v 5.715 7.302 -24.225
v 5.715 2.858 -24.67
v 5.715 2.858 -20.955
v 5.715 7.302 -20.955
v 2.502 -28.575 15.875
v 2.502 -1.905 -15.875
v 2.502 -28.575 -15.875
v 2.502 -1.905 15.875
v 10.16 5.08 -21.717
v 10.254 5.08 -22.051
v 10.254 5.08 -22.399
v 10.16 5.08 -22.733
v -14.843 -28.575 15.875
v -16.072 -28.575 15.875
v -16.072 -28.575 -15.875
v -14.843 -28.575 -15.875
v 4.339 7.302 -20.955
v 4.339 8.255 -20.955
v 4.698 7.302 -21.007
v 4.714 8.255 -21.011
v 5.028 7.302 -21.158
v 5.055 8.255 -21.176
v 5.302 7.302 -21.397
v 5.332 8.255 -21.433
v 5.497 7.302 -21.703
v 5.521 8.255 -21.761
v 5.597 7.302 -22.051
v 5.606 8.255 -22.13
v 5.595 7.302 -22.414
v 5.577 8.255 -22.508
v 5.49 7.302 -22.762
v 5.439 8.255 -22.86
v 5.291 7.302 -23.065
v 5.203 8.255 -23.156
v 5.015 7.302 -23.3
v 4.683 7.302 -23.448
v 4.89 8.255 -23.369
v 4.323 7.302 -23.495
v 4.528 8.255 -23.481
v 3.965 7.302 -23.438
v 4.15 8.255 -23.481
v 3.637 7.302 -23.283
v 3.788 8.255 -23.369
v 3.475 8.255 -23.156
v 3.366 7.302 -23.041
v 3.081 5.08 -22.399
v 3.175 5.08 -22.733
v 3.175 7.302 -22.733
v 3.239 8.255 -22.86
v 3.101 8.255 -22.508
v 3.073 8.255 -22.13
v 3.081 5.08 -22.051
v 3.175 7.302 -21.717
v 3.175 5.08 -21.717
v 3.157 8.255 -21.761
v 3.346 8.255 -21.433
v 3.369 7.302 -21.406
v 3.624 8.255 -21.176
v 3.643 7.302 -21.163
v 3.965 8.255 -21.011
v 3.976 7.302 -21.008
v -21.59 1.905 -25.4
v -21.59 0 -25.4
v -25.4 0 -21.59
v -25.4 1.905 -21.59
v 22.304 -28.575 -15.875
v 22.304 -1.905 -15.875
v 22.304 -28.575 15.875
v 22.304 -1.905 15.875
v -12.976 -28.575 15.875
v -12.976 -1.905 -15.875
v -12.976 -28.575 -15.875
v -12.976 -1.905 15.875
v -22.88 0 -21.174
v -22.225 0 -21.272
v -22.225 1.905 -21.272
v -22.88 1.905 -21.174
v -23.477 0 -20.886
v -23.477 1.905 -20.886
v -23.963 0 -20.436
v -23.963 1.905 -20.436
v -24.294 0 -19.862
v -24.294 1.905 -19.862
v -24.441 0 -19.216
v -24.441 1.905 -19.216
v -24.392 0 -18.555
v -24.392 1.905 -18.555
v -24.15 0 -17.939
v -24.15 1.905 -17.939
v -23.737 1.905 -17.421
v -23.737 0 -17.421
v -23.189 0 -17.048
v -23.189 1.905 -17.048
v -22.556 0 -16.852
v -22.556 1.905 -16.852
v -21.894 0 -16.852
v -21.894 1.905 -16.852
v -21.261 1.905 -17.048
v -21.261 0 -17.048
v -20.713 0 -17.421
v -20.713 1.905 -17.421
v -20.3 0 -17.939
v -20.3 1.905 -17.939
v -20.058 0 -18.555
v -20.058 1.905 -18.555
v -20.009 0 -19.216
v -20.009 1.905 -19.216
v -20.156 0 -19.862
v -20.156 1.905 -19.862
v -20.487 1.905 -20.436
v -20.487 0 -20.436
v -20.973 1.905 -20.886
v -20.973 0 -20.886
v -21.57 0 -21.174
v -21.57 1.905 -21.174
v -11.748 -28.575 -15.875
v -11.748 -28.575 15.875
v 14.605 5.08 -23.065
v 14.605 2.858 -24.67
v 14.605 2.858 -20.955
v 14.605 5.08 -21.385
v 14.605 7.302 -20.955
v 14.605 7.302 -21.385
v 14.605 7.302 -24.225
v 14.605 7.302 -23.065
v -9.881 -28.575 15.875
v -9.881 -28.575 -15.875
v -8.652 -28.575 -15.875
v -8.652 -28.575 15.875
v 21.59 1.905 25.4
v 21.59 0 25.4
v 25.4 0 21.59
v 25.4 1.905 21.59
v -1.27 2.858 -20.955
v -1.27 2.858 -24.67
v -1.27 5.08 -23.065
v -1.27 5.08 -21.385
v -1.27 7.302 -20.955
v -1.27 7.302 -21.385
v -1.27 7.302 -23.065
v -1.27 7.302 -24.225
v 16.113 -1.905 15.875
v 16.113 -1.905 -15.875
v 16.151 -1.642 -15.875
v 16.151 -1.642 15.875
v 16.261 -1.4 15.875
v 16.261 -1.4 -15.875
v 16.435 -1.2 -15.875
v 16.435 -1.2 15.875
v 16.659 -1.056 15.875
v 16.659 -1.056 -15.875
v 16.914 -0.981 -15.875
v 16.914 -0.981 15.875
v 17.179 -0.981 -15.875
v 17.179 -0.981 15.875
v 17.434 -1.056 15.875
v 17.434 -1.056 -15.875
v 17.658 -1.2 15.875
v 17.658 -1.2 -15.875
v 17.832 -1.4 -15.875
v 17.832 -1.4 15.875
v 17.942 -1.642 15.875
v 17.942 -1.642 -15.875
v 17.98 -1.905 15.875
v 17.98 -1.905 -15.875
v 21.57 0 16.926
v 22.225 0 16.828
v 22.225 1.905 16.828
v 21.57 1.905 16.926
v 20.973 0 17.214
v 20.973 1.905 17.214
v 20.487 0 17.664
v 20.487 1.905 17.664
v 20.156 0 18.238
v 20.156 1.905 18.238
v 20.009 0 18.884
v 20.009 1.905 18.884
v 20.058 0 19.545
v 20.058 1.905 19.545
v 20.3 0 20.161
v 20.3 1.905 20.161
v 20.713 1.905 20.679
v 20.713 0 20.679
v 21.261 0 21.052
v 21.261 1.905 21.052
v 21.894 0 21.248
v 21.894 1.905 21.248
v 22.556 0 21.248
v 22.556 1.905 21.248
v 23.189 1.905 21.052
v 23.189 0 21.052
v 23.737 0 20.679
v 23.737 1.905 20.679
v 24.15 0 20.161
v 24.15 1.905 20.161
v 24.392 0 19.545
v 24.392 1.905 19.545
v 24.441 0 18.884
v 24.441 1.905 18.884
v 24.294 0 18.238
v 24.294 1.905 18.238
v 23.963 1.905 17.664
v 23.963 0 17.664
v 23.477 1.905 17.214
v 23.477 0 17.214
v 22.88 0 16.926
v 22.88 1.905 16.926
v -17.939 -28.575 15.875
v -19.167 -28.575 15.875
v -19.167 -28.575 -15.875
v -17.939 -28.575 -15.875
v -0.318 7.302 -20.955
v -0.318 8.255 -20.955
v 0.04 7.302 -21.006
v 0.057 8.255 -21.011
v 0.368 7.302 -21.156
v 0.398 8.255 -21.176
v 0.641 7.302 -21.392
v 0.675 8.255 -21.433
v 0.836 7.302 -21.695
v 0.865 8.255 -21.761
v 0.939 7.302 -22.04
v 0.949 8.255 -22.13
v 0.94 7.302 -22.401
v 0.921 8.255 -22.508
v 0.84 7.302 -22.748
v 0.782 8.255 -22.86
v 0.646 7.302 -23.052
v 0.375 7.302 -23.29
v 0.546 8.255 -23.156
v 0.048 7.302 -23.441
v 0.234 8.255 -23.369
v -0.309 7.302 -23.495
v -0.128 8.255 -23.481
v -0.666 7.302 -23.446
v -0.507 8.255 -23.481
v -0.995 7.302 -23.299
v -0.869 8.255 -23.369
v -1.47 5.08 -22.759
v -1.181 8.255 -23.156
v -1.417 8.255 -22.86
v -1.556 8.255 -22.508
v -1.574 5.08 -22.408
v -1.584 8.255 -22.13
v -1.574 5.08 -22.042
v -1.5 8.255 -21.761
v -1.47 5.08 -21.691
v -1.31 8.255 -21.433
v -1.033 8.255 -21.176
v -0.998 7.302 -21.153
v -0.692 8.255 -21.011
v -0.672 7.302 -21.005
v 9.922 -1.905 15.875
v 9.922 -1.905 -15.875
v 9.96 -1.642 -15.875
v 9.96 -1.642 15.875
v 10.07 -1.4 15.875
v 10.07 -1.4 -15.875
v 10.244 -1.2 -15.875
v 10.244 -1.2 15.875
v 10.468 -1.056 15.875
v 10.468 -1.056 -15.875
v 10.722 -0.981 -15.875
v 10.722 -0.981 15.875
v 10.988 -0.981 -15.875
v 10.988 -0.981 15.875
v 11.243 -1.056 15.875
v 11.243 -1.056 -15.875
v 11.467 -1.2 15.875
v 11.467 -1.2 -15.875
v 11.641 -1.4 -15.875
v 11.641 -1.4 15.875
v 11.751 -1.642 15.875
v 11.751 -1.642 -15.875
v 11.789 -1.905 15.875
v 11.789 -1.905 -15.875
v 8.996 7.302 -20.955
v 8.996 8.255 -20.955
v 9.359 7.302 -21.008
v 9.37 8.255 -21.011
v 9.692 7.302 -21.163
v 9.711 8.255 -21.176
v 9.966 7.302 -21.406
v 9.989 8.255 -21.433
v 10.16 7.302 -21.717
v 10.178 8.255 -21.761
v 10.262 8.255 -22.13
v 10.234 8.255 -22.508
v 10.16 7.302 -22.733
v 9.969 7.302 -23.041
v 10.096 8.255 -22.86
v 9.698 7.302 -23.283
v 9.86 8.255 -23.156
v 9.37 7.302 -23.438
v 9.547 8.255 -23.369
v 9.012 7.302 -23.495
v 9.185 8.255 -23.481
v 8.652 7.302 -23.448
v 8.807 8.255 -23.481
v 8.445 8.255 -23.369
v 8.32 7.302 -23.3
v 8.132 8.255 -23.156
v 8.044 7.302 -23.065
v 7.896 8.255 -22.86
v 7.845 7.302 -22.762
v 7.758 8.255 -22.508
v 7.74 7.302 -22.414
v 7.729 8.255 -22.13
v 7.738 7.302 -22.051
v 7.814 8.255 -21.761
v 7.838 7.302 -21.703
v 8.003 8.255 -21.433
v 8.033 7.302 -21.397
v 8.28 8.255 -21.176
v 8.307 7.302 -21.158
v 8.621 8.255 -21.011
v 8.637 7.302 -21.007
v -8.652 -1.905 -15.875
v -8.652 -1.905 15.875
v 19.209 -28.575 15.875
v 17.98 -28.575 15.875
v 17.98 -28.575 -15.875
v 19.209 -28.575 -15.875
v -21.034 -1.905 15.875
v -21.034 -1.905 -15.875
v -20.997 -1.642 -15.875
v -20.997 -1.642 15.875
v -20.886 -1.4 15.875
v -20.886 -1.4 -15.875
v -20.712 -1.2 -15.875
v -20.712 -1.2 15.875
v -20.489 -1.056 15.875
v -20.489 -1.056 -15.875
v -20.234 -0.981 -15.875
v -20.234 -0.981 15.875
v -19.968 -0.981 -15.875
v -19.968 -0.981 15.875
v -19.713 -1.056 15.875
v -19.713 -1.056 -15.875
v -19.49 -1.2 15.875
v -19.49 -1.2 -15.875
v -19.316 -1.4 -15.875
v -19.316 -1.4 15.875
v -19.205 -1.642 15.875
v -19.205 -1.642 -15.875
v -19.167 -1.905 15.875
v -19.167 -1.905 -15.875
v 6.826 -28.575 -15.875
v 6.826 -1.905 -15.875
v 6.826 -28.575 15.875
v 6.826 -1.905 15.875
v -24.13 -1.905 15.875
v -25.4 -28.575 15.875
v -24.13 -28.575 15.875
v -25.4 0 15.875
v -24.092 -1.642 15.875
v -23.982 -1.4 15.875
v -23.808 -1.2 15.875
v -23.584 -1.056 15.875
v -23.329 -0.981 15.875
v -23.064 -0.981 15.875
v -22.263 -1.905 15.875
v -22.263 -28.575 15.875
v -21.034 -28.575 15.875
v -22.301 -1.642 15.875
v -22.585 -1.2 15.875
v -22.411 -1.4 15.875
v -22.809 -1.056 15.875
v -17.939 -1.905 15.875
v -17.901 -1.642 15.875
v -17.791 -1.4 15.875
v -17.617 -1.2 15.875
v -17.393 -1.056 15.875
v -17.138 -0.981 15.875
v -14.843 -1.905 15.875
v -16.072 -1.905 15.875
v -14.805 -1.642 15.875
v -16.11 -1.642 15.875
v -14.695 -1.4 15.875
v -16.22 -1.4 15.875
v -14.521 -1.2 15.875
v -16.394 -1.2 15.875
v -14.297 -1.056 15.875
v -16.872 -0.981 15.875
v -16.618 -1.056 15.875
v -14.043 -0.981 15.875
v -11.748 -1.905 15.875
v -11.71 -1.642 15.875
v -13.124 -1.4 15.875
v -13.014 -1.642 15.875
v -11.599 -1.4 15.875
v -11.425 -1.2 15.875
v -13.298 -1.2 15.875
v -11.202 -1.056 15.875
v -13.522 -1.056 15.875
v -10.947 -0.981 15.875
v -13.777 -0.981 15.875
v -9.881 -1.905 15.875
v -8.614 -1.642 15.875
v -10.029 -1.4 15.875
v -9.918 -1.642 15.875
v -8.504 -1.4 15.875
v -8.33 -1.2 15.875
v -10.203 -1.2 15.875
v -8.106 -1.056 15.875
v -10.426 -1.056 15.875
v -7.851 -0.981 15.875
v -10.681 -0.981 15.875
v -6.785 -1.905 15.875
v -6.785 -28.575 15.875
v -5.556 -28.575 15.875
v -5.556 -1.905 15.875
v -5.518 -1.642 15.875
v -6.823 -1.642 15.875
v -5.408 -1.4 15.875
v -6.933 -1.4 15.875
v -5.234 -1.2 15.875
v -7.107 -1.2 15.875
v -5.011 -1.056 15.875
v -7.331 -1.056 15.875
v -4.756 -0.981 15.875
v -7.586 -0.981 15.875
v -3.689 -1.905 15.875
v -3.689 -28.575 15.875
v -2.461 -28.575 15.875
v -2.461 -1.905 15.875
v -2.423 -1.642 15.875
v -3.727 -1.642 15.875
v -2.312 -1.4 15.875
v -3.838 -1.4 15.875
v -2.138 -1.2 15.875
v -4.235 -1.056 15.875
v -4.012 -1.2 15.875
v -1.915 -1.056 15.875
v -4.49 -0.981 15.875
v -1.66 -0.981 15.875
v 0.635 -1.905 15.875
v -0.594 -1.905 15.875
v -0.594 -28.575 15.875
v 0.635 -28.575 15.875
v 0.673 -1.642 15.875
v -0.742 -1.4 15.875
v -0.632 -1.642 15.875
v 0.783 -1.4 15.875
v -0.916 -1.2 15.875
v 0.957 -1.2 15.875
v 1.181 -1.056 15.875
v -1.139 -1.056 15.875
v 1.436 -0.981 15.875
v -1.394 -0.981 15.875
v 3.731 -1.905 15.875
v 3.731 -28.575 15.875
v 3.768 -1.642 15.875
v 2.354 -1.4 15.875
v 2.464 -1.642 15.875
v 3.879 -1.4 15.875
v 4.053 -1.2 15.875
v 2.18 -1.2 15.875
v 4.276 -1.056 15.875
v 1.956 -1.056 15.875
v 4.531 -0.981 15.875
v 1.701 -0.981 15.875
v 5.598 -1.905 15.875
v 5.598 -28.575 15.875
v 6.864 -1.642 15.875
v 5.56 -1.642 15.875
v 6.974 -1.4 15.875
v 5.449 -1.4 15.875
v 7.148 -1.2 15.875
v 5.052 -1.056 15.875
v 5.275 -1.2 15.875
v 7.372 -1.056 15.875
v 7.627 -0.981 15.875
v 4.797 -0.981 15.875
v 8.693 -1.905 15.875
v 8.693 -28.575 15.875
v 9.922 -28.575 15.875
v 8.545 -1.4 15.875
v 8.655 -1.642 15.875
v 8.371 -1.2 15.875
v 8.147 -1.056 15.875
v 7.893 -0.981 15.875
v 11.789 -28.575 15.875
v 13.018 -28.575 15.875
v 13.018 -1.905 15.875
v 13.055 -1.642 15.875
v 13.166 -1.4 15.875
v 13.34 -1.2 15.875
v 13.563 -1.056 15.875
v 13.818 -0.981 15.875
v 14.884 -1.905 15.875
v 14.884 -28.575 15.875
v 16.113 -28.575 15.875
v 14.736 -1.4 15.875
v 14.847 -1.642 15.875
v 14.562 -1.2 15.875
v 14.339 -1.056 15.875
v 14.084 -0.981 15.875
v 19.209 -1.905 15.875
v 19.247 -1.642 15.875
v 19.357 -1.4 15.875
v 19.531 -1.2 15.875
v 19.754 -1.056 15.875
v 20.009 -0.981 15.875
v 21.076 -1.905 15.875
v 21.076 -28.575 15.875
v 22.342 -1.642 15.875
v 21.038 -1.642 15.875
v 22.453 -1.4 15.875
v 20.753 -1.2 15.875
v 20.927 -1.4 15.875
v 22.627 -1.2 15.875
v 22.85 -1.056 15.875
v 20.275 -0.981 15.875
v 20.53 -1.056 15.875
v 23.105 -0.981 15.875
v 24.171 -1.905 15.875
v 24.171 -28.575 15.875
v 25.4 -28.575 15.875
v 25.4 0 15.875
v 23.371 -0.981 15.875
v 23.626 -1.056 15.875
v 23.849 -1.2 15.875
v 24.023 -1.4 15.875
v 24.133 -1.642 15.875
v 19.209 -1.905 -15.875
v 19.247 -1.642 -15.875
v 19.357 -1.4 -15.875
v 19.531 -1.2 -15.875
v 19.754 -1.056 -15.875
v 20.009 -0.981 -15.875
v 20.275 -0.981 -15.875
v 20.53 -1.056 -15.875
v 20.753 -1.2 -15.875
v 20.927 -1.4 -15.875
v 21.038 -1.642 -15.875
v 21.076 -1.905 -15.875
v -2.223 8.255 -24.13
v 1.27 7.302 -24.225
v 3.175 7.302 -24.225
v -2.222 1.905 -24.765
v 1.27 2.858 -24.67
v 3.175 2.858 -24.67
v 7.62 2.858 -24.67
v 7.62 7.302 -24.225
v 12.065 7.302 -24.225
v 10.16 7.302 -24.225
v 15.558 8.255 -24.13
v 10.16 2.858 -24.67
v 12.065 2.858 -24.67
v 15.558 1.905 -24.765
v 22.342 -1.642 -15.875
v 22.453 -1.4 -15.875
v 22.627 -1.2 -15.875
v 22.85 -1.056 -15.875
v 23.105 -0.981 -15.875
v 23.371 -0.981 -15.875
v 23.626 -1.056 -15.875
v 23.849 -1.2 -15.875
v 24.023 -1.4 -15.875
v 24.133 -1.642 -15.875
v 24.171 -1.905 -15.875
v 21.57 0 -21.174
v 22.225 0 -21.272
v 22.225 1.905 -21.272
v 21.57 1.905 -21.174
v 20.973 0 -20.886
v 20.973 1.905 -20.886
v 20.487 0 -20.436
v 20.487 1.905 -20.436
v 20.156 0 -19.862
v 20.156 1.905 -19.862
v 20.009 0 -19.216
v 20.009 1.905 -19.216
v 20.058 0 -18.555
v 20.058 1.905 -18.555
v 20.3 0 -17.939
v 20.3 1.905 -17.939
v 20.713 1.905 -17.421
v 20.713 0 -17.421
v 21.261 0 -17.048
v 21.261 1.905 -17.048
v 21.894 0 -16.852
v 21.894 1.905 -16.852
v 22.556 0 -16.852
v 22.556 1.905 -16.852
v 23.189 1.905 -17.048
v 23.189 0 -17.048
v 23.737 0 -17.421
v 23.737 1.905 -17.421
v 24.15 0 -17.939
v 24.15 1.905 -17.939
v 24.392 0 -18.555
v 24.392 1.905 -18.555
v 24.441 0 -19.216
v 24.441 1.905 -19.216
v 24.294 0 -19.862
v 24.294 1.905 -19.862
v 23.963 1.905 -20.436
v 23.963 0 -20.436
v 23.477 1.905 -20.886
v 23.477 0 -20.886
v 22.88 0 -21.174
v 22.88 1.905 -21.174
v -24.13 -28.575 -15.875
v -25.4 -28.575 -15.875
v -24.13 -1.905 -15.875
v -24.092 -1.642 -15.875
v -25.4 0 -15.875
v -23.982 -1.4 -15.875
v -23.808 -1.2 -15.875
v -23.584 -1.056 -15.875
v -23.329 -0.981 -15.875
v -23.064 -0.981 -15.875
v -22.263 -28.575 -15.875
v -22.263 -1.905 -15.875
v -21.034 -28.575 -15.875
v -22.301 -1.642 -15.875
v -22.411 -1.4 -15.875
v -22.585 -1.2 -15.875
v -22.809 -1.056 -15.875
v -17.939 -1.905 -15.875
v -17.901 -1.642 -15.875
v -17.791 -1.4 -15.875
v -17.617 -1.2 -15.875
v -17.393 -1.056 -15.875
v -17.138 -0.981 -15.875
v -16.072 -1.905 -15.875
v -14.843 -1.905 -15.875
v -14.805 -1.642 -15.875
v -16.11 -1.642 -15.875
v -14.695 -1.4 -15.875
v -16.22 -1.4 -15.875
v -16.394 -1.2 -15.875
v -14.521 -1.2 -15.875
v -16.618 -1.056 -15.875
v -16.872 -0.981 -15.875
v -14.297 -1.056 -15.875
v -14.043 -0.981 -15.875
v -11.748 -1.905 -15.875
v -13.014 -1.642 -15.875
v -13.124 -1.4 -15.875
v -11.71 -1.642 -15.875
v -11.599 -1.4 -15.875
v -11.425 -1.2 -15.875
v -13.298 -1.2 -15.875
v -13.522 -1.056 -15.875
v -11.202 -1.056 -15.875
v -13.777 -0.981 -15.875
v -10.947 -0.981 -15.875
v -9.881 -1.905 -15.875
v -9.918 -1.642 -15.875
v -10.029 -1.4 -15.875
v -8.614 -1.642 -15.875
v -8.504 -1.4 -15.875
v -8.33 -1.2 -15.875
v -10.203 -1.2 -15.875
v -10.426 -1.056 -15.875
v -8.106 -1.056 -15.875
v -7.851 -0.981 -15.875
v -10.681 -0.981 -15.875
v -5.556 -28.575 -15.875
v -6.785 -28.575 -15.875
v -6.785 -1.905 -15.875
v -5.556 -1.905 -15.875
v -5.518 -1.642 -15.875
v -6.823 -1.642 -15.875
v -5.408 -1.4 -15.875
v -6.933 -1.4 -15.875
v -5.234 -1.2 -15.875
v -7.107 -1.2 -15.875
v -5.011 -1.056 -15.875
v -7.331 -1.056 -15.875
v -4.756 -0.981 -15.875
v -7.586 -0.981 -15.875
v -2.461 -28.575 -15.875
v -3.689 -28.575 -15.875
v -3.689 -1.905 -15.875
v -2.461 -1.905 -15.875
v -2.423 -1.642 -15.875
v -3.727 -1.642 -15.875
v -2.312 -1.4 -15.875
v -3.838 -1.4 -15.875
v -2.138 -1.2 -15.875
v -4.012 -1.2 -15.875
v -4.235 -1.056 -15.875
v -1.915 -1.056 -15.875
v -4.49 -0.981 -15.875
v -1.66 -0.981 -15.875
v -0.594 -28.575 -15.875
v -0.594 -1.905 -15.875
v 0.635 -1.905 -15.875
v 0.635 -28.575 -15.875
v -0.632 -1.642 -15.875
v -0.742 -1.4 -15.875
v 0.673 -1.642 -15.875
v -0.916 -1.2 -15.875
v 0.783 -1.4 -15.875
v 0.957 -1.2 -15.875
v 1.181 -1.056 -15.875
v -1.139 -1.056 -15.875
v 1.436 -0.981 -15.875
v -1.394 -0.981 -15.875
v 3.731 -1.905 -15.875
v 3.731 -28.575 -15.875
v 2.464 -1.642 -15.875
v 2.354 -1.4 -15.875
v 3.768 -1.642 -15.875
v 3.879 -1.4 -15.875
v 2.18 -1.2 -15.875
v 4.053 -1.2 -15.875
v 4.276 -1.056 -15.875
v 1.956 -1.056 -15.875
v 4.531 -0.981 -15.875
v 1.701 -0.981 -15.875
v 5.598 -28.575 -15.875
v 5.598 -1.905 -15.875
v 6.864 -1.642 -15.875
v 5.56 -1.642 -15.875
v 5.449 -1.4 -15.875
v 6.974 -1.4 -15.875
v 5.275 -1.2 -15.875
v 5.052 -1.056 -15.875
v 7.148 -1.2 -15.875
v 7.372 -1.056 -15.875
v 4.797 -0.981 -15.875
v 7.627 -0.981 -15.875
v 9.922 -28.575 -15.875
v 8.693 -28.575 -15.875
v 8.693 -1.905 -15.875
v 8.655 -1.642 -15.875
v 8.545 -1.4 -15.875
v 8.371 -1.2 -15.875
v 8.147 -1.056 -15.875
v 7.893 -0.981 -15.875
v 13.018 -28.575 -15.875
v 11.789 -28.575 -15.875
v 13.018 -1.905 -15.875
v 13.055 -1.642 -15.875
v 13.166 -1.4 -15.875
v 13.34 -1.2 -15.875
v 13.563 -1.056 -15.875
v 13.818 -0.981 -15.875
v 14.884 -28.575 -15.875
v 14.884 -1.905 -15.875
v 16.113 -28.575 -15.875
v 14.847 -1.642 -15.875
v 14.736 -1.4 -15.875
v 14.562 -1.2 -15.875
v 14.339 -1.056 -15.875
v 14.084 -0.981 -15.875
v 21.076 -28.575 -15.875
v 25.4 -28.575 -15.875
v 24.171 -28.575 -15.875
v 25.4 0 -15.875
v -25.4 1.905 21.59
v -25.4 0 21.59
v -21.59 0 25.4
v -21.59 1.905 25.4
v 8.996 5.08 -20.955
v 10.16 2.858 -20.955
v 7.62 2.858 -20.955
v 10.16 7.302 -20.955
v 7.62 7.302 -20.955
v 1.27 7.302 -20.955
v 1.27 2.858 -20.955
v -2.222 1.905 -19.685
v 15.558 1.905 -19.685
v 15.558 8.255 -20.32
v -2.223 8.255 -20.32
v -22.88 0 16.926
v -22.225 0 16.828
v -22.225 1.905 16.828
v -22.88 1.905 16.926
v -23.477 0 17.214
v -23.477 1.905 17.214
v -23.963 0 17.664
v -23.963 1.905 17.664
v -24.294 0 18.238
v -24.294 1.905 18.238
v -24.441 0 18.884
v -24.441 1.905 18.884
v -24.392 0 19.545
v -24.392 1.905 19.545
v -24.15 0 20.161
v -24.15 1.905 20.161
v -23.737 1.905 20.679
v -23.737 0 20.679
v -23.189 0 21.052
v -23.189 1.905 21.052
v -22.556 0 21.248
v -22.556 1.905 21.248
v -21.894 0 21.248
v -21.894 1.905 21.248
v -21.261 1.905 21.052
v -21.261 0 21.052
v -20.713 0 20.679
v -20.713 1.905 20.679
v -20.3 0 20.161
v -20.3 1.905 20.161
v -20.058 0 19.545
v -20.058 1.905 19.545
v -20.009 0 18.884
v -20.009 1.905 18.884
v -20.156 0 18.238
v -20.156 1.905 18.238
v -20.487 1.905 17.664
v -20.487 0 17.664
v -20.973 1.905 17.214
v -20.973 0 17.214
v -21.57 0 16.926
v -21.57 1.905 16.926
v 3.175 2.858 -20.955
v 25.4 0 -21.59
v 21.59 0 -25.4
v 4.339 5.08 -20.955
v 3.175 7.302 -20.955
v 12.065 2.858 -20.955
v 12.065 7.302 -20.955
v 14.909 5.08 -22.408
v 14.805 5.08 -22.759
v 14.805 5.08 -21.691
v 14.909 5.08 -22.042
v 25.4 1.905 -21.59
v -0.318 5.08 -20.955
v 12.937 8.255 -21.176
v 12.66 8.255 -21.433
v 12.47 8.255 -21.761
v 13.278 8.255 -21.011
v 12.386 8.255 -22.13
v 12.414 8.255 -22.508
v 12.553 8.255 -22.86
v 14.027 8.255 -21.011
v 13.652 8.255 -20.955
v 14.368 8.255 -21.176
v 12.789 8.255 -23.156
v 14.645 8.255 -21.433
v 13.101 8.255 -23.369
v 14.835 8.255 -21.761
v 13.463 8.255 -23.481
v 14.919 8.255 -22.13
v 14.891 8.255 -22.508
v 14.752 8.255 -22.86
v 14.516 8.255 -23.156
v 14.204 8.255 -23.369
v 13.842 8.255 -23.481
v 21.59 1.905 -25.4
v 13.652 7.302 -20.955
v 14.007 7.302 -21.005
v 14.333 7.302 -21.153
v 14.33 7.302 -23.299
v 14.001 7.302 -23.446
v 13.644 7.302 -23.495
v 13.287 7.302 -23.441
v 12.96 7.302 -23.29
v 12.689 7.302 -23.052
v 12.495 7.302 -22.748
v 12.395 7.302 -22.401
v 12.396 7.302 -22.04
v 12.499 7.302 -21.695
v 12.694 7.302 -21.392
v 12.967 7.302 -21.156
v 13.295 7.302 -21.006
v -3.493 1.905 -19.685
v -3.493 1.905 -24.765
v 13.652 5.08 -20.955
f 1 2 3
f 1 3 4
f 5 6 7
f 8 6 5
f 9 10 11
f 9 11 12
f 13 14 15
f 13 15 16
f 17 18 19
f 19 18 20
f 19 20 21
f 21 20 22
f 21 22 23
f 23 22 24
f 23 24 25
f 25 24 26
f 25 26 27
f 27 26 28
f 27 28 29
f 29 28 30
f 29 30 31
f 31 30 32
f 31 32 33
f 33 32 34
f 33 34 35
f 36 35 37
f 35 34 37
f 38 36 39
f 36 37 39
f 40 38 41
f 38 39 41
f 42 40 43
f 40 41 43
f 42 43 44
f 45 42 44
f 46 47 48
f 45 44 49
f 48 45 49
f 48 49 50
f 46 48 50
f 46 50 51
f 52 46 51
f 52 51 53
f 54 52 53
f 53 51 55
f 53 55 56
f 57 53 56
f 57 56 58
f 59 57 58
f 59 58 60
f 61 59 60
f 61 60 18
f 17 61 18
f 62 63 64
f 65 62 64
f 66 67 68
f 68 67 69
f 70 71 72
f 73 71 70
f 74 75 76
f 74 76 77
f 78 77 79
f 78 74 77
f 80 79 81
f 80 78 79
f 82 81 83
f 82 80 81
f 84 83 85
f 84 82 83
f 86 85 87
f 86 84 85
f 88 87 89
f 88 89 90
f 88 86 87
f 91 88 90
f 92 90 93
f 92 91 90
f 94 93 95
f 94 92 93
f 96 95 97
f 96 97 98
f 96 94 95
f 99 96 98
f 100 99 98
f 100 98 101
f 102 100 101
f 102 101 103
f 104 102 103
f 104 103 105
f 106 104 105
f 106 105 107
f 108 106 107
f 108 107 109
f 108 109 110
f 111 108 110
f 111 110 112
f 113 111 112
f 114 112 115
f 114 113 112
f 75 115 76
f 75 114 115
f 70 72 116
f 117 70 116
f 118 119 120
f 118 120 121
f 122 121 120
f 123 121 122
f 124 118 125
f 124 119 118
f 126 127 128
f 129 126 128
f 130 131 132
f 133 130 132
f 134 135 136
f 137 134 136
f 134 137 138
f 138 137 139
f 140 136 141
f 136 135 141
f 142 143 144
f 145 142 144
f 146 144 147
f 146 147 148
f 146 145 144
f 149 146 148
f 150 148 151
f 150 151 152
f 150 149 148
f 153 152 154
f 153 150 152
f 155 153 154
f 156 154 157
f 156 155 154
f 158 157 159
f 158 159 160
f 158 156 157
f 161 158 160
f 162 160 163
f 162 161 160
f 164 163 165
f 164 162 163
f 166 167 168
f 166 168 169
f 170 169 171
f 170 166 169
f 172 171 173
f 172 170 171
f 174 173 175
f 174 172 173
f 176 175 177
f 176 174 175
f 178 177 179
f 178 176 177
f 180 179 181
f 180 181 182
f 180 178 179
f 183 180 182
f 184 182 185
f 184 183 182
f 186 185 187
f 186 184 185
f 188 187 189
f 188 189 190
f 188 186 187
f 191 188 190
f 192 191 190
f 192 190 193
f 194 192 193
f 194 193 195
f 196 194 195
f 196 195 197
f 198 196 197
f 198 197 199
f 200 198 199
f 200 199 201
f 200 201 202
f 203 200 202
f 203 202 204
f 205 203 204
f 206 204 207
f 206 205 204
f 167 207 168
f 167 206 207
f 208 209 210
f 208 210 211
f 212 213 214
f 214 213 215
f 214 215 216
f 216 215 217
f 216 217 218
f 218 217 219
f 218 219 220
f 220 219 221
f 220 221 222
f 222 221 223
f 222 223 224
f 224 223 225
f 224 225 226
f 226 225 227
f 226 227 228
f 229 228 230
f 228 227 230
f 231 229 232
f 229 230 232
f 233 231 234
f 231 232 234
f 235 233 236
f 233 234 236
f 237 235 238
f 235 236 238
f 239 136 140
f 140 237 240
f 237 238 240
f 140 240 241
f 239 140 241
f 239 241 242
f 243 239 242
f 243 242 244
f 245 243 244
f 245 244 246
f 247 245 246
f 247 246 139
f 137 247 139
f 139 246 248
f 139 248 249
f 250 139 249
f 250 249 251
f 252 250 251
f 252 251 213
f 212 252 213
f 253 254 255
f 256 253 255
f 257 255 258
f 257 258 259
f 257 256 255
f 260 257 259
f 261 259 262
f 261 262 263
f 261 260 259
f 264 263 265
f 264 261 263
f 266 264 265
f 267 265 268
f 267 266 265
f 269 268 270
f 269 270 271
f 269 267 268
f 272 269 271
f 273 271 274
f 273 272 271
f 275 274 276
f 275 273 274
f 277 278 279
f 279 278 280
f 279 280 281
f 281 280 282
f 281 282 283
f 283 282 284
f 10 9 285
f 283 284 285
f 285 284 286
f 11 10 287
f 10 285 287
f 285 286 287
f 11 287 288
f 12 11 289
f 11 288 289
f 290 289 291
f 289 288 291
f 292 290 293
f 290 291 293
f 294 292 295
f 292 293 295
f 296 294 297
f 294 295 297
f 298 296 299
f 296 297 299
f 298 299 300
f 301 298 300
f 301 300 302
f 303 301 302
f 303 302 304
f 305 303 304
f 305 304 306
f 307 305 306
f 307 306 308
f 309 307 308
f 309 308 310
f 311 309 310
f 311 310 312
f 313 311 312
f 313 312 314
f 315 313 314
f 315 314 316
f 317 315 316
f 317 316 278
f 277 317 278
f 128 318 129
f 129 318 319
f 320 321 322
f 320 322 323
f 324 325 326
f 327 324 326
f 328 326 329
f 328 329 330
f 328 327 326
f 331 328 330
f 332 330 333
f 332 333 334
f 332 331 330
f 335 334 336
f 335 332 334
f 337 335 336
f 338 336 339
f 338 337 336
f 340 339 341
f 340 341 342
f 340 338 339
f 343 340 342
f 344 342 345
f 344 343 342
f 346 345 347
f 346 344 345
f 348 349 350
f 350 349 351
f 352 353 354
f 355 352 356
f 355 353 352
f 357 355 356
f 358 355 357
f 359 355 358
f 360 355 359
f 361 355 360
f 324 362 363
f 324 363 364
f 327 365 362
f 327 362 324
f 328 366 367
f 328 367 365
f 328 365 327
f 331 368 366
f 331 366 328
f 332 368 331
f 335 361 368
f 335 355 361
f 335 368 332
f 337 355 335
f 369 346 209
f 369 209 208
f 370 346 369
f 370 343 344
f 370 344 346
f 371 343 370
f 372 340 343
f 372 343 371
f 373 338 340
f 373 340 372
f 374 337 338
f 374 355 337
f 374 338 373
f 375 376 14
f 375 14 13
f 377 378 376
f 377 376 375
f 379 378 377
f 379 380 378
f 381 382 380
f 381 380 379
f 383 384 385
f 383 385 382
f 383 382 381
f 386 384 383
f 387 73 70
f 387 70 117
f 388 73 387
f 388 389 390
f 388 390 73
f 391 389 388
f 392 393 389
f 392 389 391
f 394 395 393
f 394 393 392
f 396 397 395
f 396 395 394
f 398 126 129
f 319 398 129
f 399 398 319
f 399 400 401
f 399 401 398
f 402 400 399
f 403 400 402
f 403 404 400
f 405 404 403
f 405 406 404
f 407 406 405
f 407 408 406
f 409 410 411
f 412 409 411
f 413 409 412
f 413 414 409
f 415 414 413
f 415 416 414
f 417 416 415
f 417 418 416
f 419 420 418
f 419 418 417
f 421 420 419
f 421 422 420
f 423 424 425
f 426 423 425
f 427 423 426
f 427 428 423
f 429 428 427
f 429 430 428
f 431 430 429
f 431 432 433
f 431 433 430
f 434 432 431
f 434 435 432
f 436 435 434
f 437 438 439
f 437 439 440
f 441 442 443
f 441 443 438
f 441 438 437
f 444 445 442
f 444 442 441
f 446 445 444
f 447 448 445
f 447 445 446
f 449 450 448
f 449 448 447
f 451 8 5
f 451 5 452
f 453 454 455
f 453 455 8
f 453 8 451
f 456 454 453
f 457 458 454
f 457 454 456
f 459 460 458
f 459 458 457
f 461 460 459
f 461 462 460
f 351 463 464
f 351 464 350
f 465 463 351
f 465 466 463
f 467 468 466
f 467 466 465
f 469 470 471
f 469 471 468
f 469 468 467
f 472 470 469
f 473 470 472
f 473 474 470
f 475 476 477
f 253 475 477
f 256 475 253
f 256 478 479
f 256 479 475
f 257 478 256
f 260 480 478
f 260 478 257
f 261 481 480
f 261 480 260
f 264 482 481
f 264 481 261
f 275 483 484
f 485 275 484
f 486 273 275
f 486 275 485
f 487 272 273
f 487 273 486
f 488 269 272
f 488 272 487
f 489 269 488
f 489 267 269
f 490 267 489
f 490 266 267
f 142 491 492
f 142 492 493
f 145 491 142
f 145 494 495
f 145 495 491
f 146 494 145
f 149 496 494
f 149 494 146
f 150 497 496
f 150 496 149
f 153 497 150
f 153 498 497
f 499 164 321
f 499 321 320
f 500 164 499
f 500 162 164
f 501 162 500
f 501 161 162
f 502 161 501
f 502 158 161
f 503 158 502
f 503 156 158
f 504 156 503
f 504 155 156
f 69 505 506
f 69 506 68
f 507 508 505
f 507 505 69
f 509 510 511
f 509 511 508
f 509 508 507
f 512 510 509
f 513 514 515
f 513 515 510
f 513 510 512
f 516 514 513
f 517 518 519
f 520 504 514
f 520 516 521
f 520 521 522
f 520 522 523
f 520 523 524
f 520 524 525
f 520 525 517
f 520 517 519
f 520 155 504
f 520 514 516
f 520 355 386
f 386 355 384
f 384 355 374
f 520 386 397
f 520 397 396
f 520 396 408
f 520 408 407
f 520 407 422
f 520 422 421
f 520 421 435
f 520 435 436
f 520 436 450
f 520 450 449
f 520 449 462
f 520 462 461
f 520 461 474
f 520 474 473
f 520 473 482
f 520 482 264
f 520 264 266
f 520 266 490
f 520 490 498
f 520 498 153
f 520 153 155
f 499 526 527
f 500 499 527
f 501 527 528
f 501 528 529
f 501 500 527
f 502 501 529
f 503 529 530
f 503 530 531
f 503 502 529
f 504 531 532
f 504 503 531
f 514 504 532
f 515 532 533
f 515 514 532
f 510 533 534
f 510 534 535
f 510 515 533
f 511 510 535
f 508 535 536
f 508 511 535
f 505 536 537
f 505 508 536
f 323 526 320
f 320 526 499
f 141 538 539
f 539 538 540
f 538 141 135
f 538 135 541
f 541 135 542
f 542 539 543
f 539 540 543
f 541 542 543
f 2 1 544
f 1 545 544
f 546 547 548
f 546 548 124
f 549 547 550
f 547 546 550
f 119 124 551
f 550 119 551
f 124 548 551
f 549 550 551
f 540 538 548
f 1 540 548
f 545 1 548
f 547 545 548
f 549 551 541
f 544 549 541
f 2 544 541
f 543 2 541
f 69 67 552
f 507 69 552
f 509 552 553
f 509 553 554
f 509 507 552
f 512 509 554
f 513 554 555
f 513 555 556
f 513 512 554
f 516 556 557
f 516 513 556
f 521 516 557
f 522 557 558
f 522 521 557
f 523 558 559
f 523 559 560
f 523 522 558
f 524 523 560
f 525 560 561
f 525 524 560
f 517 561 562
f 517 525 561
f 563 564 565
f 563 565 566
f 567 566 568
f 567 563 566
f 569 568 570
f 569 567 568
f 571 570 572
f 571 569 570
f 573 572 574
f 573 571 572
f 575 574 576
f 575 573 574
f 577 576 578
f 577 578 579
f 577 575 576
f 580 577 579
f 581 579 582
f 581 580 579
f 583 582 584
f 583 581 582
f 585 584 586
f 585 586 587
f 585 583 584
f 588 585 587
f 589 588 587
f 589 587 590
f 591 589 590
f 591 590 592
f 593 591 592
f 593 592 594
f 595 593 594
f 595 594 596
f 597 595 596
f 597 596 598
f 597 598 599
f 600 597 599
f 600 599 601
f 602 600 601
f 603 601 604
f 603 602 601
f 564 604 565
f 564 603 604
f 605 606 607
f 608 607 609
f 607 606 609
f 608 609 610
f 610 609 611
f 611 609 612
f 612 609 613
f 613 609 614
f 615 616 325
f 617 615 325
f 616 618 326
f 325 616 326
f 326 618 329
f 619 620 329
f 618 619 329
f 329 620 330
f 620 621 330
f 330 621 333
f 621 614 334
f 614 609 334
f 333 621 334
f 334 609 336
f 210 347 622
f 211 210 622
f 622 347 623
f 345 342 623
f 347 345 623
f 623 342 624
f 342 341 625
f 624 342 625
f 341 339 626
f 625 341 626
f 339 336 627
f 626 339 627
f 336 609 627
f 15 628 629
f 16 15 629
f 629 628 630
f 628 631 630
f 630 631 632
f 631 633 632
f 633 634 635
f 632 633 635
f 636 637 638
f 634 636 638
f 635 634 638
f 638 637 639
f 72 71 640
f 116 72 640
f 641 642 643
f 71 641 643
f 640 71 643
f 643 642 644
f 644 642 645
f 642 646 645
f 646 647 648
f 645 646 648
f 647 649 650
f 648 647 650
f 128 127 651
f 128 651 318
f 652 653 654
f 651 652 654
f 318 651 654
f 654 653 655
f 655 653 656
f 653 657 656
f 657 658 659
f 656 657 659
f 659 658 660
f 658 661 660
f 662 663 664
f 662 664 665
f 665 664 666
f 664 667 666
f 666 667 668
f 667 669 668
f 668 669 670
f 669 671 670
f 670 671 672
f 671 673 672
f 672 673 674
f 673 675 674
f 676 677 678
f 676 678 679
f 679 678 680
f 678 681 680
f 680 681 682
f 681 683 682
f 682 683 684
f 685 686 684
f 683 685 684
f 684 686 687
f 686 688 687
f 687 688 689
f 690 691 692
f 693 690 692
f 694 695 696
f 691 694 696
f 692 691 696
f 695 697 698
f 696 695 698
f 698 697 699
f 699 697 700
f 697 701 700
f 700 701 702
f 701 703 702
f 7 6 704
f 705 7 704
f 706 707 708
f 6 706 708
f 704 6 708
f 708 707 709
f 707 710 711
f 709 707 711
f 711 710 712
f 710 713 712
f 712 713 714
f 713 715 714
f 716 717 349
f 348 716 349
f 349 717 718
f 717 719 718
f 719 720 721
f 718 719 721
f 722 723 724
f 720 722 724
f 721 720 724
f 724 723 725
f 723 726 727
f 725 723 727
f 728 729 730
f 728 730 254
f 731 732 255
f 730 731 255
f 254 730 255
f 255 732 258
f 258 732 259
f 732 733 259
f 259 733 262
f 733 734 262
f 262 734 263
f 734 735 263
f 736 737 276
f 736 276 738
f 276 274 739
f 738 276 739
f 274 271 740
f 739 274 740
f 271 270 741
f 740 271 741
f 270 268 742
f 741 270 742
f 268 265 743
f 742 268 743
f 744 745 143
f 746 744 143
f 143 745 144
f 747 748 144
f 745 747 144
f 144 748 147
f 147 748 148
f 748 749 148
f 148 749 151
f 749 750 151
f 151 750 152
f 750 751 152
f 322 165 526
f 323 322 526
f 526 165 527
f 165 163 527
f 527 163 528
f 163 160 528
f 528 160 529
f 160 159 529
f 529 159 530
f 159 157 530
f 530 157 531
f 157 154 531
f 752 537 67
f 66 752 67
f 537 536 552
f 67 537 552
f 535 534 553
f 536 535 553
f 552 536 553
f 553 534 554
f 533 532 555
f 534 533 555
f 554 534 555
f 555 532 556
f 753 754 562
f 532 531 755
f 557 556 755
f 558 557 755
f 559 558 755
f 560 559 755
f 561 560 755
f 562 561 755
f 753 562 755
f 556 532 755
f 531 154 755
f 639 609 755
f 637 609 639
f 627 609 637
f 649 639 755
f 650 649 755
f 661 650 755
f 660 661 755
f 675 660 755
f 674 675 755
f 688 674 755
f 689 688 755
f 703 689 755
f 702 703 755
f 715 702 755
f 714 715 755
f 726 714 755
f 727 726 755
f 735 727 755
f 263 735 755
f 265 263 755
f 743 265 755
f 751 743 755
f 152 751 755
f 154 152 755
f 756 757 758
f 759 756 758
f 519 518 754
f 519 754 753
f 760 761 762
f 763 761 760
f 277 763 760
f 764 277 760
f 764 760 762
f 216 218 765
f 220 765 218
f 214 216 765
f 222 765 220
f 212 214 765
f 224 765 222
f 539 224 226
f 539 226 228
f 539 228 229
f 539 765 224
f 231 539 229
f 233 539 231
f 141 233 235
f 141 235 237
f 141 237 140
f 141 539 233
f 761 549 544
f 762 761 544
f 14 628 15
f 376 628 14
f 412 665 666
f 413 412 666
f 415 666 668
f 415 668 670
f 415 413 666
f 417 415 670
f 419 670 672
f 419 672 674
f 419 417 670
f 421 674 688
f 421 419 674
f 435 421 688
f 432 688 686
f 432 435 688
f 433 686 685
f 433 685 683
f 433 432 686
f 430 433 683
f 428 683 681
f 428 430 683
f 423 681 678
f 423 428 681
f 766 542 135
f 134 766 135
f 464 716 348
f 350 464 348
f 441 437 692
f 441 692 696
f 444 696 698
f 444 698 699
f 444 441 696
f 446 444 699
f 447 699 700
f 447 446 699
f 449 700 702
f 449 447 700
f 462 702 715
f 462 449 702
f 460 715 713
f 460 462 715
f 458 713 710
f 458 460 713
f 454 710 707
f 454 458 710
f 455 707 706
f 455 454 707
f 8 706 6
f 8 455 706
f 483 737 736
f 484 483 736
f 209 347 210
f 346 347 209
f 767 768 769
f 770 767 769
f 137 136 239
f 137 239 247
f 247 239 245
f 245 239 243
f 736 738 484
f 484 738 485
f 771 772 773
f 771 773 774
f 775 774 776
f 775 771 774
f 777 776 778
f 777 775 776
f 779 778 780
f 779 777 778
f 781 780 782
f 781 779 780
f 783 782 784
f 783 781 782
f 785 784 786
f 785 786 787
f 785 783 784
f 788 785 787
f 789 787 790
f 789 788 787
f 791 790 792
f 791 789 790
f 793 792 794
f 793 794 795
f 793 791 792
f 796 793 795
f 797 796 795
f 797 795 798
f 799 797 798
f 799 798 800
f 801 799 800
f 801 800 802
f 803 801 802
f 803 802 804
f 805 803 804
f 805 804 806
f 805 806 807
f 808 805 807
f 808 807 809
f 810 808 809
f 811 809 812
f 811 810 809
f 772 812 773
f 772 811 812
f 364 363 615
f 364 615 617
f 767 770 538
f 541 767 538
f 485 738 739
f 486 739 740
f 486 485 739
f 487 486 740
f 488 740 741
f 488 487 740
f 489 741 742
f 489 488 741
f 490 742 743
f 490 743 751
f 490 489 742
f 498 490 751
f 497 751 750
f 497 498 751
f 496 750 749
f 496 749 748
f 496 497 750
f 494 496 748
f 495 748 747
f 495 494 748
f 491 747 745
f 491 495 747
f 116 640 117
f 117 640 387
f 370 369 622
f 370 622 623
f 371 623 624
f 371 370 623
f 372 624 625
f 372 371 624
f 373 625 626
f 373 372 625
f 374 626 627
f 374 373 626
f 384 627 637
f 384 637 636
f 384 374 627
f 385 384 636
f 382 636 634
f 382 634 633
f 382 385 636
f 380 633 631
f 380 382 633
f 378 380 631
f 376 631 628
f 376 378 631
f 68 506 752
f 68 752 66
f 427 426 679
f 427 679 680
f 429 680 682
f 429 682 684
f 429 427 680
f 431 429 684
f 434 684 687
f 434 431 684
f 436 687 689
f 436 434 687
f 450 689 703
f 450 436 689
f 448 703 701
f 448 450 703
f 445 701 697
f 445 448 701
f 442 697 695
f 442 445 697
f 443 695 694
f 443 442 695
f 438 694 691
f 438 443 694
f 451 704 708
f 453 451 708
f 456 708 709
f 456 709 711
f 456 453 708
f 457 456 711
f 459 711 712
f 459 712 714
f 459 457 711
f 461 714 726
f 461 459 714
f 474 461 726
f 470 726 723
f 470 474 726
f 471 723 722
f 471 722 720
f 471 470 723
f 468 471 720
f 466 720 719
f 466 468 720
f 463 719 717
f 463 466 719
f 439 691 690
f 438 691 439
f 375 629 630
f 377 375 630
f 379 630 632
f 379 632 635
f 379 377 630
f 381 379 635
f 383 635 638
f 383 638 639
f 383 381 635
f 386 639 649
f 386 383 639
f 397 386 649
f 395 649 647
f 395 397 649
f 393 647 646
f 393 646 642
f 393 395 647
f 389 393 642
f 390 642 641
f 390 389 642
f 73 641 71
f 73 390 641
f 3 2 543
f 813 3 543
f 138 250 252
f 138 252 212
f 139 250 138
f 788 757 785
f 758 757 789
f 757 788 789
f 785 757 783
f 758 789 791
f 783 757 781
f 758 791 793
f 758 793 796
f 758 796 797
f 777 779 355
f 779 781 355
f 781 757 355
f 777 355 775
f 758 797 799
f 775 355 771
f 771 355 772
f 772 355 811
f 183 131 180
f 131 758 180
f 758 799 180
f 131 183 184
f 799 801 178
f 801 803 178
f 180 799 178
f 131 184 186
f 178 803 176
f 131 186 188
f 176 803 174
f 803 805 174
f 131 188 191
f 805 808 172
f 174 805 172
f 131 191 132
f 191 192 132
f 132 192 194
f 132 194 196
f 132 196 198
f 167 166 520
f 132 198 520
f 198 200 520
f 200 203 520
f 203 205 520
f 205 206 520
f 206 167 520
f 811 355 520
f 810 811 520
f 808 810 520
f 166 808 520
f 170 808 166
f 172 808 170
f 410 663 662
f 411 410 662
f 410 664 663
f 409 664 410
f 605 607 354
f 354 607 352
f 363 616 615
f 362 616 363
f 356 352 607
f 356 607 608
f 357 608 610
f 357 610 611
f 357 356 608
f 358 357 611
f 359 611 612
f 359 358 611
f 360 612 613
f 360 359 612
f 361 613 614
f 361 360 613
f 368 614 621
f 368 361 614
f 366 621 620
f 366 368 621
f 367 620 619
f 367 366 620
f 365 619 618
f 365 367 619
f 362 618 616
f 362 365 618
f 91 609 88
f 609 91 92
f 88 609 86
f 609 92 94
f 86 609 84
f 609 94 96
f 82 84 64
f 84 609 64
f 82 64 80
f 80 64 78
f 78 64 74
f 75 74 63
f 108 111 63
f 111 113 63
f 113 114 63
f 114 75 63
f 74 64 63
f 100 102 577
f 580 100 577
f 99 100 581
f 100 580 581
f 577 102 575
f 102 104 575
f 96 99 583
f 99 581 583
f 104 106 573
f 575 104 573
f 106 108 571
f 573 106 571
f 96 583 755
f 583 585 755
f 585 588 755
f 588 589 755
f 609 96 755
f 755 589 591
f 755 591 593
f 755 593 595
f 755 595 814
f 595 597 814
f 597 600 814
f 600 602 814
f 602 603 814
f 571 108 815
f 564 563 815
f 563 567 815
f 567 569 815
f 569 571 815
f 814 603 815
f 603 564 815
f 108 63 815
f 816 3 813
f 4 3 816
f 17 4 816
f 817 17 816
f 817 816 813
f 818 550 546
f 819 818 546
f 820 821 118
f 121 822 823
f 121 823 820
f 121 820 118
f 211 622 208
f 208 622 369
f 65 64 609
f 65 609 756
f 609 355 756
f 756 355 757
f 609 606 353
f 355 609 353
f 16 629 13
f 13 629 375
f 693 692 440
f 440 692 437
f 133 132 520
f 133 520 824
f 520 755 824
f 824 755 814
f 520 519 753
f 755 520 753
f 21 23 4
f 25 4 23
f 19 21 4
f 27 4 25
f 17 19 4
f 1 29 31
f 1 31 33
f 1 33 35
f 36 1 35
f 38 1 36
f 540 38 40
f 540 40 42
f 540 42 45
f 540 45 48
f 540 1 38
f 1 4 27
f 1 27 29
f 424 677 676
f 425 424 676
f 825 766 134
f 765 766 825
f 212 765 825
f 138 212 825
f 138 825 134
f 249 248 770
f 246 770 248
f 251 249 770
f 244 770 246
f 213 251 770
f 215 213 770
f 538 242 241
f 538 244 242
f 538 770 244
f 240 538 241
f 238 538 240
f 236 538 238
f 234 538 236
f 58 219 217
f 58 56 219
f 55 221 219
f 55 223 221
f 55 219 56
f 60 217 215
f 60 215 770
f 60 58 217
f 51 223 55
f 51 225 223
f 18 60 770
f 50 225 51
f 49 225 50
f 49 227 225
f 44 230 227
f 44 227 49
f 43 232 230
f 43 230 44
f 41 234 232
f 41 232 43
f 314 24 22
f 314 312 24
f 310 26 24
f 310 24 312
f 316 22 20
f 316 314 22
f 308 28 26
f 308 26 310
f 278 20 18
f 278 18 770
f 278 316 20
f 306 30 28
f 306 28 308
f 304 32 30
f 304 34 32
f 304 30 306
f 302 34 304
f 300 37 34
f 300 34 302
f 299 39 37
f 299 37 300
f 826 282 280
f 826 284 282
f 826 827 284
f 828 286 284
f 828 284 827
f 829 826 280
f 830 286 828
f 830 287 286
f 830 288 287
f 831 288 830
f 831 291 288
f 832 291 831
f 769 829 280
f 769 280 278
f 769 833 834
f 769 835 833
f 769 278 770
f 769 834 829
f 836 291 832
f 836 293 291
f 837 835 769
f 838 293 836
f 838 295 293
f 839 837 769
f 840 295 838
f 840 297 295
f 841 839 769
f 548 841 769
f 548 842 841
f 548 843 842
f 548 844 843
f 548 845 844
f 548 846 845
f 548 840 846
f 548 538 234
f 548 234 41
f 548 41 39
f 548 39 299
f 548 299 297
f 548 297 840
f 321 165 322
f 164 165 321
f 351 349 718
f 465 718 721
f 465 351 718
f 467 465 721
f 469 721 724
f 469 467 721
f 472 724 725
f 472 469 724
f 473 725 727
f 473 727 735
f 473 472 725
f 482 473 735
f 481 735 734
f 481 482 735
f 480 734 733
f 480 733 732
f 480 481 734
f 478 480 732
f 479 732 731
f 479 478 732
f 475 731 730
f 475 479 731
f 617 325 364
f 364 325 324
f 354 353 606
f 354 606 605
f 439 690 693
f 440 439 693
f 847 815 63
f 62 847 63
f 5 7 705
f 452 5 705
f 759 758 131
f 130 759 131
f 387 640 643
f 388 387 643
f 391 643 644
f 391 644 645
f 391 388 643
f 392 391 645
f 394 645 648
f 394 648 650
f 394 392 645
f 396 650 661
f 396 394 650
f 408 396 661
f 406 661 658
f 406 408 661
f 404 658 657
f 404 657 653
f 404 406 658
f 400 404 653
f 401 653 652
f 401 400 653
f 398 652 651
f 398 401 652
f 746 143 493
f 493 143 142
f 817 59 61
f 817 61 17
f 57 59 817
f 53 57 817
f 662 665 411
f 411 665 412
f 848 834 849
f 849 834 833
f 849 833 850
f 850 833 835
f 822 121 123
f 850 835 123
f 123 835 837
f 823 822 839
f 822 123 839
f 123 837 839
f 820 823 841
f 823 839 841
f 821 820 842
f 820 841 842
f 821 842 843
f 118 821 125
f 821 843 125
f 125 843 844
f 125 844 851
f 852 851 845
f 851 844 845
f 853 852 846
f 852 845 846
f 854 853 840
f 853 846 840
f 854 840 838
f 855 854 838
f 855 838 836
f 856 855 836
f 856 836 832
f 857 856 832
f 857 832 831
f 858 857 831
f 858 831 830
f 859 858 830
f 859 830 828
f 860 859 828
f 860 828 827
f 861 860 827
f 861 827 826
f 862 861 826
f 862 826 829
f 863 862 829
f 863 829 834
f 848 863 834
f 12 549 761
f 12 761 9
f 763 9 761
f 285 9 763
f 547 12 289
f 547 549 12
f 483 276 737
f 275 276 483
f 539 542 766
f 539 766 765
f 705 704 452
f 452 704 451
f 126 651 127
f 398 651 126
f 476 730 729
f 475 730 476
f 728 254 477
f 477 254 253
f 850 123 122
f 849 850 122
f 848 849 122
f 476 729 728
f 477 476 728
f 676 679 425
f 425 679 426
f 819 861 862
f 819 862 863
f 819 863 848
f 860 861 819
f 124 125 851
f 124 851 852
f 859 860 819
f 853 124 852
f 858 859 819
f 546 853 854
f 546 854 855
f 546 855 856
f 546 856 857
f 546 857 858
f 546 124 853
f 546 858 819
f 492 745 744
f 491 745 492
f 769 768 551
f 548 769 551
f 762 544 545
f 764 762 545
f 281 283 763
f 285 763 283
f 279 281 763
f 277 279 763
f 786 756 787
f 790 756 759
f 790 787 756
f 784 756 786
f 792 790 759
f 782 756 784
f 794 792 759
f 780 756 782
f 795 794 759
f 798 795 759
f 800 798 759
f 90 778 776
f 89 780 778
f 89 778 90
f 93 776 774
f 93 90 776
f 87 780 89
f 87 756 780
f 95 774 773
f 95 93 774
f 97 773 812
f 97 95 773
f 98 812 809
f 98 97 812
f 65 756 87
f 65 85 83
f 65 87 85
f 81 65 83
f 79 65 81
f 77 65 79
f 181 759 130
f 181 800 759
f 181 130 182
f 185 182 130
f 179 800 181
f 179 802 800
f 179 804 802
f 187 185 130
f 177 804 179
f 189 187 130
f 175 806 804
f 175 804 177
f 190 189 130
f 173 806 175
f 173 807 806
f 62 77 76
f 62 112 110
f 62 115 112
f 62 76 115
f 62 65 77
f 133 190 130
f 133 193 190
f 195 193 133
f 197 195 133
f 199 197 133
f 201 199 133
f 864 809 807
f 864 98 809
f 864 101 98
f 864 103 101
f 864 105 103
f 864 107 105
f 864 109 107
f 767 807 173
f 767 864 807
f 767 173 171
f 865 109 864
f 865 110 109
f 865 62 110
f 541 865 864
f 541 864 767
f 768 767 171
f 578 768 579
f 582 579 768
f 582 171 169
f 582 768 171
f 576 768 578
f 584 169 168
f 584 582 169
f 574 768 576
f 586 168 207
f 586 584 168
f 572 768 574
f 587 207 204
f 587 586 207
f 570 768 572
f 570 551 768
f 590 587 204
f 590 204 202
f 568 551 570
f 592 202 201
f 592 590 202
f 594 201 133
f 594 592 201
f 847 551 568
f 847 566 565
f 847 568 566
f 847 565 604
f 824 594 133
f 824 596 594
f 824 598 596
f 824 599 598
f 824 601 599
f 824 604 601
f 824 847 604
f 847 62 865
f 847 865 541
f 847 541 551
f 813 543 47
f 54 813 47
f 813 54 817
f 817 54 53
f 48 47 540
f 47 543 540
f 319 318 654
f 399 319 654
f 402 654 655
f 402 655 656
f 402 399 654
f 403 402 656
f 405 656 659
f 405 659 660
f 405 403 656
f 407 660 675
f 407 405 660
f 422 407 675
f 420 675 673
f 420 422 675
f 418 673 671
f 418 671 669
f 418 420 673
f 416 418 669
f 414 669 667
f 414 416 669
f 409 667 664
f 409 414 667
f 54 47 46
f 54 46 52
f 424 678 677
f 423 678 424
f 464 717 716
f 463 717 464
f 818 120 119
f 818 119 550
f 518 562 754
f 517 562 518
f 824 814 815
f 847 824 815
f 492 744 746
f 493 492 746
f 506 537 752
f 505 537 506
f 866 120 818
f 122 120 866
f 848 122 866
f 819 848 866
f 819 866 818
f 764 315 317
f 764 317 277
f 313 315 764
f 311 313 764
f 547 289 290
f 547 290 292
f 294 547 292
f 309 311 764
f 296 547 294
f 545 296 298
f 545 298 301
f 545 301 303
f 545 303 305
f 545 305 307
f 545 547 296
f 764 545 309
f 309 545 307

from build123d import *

# Parameters (mm, degrees)
SKETCH1_R           = 2.2225
BOSS_EXTRUDE1_DEPTH = 1.905
SKETCH2_W           = 1.228725
SKETCH2_H           = 31.75
SKETCH2_W_2         = 1.27
BOSS_EXTRUDE2_DEPTH = 28.575
BOSS_EXTRUDE4_DEPTH = 31.75
SKETCH4_W           = 17.78
SKETCH4_H           = 5.08
BOSS_EXTRUDE5_DEPTH = 6.35
CUT_EXTRUDE1_DEPTH  = 19.05
SKETCH6_R           = 1.27
CUT_EXTRUDE2_DEPTH  = 3.175
SKETCH7_W           = 2.54
SKETCH7_H           = 4.445
CUT_EXTRUDE3_DEPTH  = 4.445


with BuildPart() as part:
    # Sketch1 → Boss-Extrude1 (new body)
    with BuildSketch(Plane(origin=(0, 0, 0), x_dir=(1, 0, 0), z_dir=(0, 1, 0))):
        Polygon((21.59, 25.4), (-21.59, 25.4), (-25.4, 21.59), (-25.4, -21.59), (-21.59, -25.4), (21.59, -25.4), (25.4, -21.59), (25.4, 21.59), align=None)
        with Locations((-22.225, -19.05)):
            Circle(SKETCH1_R, mode=Mode.SUBTRACT)
        with Locations((22.225, -19.05)):
            Circle(SKETCH1_R, mode=Mode.SUBTRACT)
        with Locations((-22.225, 19.05)):
            Circle(SKETCH1_R, mode=Mode.SUBTRACT)
        with Locations((22.225, 19.05)):
            Circle(SKETCH1_R, mode=Mode.SUBTRACT)
    extrude(amount=BOSS_EXTRUDE1_DEPTH)

    # Sketch2 → Boss-Extrude2 (add)
    with BuildSketch(Plane.XZ):
        with Locations((24.7856375, 0)):
            Rectangle(SKETCH2_W, SKETCH2_H)
        with Locations((21.6900125, 0)):
            Rectangle(SKETCH2_W, SKETCH2_H)
        with Locations((18.5943875, 0)):
            Rectangle(SKETCH2_W, SKETCH2_H)
        with Locations((15.4987625, 0)):
            Rectangle(SKETCH2_W, SKETCH2_H)
        with Locations((12.4031375, 0)):
            Rectangle(SKETCH2_W, SKETCH2_H)
        with Locations((9.3075125, 0)):
            Rectangle(SKETCH2_W, SKETCH2_H)
        with Locations((6.2118875, 0)):
            Rectangle(SKETCH2_W, SKETCH2_H)
        with Locations((3.1162625, 0)):
            Rectangle(SKETCH2_W, SKETCH2_H)
        with Locations((0.0206375, 0)):
            Rectangle(SKETCH2_W, SKETCH2_H)
        with Locations((-3.0749875, 0)):
            Rectangle(SKETCH2_W, SKETCH2_H)
        with Locations((-6.1706125, 0)):
            Rectangle(SKETCH2_W, SKETCH2_H)
        with Locations((-9.2662375, 0)):
            Rectangle(SKETCH2_W, SKETCH2_H)
        with Locations((-12.3618625, 0)):
            Rectangle(SKETCH2_W, SKETCH2_H)
        with Locations((-15.4574875, 0)):
            Rectangle(SKETCH2_W, SKETCH2_H)
        with Locations((-18.5531125, 0)):
            Rectangle(SKETCH2_W, SKETCH2_H)
        with Locations((-21.6487375, 0)):
            Rectangle(SKETCH2_W, SKETCH2_H)
        with Locations((-24.765, 0)):
            Rectangle(SKETCH2_W_2, SKETCH2_H)
    extrude(amount=BOSS_EXTRUDE2_DEPTH)

    # Sketch3 → Boss-Extrude4 (add)
    with BuildSketch(Plane.XY.offset(15.875)):
        with BuildLine():
            Line((-24.13, 0), (-24.13, -1.905))
            ThreePointArc((-24.13, -1.905), (-23.19655, -0.97155), (-22.2631, -1.905))
            Line((-22.2631, -1.905), (-21.034375, -1.905))
            ThreePointArc((-21.034375, -1.905), (-20.100925, -0.97155), (-19.167475, -1.905))
            Line((-19.167475, -1.905), (-17.93875, -1.905))
            ThreePointArc((-17.93875, -1.905), (-17.0053, -0.97155), (-16.07185, -1.905))
            Line((-16.07185, -1.905), (-14.843125, -1.905))
            ThreePointArc((-14.843125, -1.905), (-13.909675, -0.97155), (-12.976225, -1.905))
            Line((-12.976225, -1.905), (-11.7475, -1.905))
            ThreePointArc((-11.7475, -1.905), (-10.81405, -0.97155), (-9.8806, -1.905))
            Line((-9.8806, -1.905), (-8.651875, -1.905))
            ThreePointArc((-8.651875, -1.905), (-7.718425, -0.97155), (-6.784975, -1.905))
            Line((-6.784975, -1.905), (-5.55625, -1.905))
            ThreePointArc((-5.55625, -1.905), (-4.6228, -0.97155), (-3.68935, -1.905))
            Line((-3.68935, -1.905), (-2.460625, -1.905))
            ThreePointArc((-2.460625, -1.905), (-1.527175, -0.97155), (-0.593725, -1.905))
            Line((-0.593725, -1.905), (0.635, -1.905))
            ThreePointArc((0.635, -1.905), (1.56845, -0.97155), (2.5019, -1.905))
            Line((2.5019, -1.905), (3.730625, -1.905))
            ThreePointArc((3.730625, -1.905), (4.664075, -0.97155), (5.597525, -1.905))
            Line((5.597525, -1.905), (6.82625, -1.905))
            ThreePointArc((6.82625, -1.905), (7.7597, -0.97155), (8.69315, -1.905))
            Line((8.69315, -1.905), (9.921875, -1.905))
            ThreePointArc((9.921875, -1.905), (10.855325, -0.97155), (11.788775, -1.905))
            Line((11.788775, -1.905), (13.0175, -1.905))
            ThreePointArc((13.0175, -1.905), (13.95095, -0.97155), (14.8844, -1.905))
            Line((14.8844, -1.905), (16.113125, -1.905))
            ThreePointArc((16.113125, -1.905), (17.046575, -0.97155), (17.980025, -1.905))
            Line((17.980025, -1.905), (19.20875, -1.905))
            ThreePointArc((19.20875, -1.905), (20.1422, -0.97155), (21.07565, -1.905))
            Line((21.07565, -1.905), (22.304375, -1.905))
            ThreePointArc((22.304375, -1.905), (23.237825, -0.97155), (24.171275, -1.905))
            Line((24.171275, -1.905), (24.171275, 0))
            Line((24.171275, 0), (-24.13, 0))
        make_face()
    extrude(amount=-BOSS_EXTRUDE4_DEPTH)

    # Sketch4 → Boss-Extrude5 (add)
    with BuildSketch(Plane(origin=(0, 1.905, 0), x_dir=(1, 0, 0), z_dir=(0, 1, 0))):
        with Locations((6.6675, 22.225)):
            Rectangle(SKETCH4_W, SKETCH4_H)
    extrude(amount=BOSS_EXTRUDE5_DEPTH)

    # Sketch5 → Cut-Extrude1 (cut)
    with BuildSketch(Plane(origin=(15.5575, 0, 0), x_dir=(0, 0, -1), z_dir=(1, 0, 0))):
        Polygon((19.685, 8.255), (19.685, 1.905), (20.32, 8.255), align=None)
        Polygon((24.765, 8.255), (24.13, 8.255), (24.765, 1.905), align=None)
    extrude(amount=-CUT_EXTRUDE1_DEPTH, mode=Mode.SUBTRACT)

    # Sketch6 → Cut-Extrude2 (cut)
    with BuildSketch(Plane(origin=(0, 8.255, 0), x_dir=(1, 0, 0), z_dir=(0, 1, 0))):
        with Locations((-0.3175, 22.225)):
            Circle(SKETCH6_R)
        with Locations((4.339166667, 22.225)):
            Circle(SKETCH6_R)
        with Locations((8.995833333, 22.225)):
            Circle(SKETCH6_R)
        with Locations((13.6525, 22.225)):
            Circle(SKETCH6_R)
    extrude(amount=-CUT_EXTRUDE2_DEPTH, mode=Mode.SUBTRACT)

    # Sketch7 → Cut-Extrude3 (cut)
    with BuildSketch(Plane(origin=(0, 0, -25.4), x_dir=(-1, 0, 0), z_dir=(0, 0, -1))):
        with Locations((-13.335, 5.08)):
            Rectangle(SKETCH7_W, SKETCH7_H)
        with Locations((-8.89, 5.08)):
            Rectangle(SKETCH7_W, SKETCH7_H)
        with Locations((-4.445, 5.08)):
            Rectangle(SKETCH7_W, SKETCH7_H)
        with Locations((0, 5.08)):
            Rectangle(SKETCH7_W, SKETCH7_H)
    extrude(amount=-CUT_EXTRUDE3_DEPTH, mode=Mode.SUBTRACT)


solid = part.part
